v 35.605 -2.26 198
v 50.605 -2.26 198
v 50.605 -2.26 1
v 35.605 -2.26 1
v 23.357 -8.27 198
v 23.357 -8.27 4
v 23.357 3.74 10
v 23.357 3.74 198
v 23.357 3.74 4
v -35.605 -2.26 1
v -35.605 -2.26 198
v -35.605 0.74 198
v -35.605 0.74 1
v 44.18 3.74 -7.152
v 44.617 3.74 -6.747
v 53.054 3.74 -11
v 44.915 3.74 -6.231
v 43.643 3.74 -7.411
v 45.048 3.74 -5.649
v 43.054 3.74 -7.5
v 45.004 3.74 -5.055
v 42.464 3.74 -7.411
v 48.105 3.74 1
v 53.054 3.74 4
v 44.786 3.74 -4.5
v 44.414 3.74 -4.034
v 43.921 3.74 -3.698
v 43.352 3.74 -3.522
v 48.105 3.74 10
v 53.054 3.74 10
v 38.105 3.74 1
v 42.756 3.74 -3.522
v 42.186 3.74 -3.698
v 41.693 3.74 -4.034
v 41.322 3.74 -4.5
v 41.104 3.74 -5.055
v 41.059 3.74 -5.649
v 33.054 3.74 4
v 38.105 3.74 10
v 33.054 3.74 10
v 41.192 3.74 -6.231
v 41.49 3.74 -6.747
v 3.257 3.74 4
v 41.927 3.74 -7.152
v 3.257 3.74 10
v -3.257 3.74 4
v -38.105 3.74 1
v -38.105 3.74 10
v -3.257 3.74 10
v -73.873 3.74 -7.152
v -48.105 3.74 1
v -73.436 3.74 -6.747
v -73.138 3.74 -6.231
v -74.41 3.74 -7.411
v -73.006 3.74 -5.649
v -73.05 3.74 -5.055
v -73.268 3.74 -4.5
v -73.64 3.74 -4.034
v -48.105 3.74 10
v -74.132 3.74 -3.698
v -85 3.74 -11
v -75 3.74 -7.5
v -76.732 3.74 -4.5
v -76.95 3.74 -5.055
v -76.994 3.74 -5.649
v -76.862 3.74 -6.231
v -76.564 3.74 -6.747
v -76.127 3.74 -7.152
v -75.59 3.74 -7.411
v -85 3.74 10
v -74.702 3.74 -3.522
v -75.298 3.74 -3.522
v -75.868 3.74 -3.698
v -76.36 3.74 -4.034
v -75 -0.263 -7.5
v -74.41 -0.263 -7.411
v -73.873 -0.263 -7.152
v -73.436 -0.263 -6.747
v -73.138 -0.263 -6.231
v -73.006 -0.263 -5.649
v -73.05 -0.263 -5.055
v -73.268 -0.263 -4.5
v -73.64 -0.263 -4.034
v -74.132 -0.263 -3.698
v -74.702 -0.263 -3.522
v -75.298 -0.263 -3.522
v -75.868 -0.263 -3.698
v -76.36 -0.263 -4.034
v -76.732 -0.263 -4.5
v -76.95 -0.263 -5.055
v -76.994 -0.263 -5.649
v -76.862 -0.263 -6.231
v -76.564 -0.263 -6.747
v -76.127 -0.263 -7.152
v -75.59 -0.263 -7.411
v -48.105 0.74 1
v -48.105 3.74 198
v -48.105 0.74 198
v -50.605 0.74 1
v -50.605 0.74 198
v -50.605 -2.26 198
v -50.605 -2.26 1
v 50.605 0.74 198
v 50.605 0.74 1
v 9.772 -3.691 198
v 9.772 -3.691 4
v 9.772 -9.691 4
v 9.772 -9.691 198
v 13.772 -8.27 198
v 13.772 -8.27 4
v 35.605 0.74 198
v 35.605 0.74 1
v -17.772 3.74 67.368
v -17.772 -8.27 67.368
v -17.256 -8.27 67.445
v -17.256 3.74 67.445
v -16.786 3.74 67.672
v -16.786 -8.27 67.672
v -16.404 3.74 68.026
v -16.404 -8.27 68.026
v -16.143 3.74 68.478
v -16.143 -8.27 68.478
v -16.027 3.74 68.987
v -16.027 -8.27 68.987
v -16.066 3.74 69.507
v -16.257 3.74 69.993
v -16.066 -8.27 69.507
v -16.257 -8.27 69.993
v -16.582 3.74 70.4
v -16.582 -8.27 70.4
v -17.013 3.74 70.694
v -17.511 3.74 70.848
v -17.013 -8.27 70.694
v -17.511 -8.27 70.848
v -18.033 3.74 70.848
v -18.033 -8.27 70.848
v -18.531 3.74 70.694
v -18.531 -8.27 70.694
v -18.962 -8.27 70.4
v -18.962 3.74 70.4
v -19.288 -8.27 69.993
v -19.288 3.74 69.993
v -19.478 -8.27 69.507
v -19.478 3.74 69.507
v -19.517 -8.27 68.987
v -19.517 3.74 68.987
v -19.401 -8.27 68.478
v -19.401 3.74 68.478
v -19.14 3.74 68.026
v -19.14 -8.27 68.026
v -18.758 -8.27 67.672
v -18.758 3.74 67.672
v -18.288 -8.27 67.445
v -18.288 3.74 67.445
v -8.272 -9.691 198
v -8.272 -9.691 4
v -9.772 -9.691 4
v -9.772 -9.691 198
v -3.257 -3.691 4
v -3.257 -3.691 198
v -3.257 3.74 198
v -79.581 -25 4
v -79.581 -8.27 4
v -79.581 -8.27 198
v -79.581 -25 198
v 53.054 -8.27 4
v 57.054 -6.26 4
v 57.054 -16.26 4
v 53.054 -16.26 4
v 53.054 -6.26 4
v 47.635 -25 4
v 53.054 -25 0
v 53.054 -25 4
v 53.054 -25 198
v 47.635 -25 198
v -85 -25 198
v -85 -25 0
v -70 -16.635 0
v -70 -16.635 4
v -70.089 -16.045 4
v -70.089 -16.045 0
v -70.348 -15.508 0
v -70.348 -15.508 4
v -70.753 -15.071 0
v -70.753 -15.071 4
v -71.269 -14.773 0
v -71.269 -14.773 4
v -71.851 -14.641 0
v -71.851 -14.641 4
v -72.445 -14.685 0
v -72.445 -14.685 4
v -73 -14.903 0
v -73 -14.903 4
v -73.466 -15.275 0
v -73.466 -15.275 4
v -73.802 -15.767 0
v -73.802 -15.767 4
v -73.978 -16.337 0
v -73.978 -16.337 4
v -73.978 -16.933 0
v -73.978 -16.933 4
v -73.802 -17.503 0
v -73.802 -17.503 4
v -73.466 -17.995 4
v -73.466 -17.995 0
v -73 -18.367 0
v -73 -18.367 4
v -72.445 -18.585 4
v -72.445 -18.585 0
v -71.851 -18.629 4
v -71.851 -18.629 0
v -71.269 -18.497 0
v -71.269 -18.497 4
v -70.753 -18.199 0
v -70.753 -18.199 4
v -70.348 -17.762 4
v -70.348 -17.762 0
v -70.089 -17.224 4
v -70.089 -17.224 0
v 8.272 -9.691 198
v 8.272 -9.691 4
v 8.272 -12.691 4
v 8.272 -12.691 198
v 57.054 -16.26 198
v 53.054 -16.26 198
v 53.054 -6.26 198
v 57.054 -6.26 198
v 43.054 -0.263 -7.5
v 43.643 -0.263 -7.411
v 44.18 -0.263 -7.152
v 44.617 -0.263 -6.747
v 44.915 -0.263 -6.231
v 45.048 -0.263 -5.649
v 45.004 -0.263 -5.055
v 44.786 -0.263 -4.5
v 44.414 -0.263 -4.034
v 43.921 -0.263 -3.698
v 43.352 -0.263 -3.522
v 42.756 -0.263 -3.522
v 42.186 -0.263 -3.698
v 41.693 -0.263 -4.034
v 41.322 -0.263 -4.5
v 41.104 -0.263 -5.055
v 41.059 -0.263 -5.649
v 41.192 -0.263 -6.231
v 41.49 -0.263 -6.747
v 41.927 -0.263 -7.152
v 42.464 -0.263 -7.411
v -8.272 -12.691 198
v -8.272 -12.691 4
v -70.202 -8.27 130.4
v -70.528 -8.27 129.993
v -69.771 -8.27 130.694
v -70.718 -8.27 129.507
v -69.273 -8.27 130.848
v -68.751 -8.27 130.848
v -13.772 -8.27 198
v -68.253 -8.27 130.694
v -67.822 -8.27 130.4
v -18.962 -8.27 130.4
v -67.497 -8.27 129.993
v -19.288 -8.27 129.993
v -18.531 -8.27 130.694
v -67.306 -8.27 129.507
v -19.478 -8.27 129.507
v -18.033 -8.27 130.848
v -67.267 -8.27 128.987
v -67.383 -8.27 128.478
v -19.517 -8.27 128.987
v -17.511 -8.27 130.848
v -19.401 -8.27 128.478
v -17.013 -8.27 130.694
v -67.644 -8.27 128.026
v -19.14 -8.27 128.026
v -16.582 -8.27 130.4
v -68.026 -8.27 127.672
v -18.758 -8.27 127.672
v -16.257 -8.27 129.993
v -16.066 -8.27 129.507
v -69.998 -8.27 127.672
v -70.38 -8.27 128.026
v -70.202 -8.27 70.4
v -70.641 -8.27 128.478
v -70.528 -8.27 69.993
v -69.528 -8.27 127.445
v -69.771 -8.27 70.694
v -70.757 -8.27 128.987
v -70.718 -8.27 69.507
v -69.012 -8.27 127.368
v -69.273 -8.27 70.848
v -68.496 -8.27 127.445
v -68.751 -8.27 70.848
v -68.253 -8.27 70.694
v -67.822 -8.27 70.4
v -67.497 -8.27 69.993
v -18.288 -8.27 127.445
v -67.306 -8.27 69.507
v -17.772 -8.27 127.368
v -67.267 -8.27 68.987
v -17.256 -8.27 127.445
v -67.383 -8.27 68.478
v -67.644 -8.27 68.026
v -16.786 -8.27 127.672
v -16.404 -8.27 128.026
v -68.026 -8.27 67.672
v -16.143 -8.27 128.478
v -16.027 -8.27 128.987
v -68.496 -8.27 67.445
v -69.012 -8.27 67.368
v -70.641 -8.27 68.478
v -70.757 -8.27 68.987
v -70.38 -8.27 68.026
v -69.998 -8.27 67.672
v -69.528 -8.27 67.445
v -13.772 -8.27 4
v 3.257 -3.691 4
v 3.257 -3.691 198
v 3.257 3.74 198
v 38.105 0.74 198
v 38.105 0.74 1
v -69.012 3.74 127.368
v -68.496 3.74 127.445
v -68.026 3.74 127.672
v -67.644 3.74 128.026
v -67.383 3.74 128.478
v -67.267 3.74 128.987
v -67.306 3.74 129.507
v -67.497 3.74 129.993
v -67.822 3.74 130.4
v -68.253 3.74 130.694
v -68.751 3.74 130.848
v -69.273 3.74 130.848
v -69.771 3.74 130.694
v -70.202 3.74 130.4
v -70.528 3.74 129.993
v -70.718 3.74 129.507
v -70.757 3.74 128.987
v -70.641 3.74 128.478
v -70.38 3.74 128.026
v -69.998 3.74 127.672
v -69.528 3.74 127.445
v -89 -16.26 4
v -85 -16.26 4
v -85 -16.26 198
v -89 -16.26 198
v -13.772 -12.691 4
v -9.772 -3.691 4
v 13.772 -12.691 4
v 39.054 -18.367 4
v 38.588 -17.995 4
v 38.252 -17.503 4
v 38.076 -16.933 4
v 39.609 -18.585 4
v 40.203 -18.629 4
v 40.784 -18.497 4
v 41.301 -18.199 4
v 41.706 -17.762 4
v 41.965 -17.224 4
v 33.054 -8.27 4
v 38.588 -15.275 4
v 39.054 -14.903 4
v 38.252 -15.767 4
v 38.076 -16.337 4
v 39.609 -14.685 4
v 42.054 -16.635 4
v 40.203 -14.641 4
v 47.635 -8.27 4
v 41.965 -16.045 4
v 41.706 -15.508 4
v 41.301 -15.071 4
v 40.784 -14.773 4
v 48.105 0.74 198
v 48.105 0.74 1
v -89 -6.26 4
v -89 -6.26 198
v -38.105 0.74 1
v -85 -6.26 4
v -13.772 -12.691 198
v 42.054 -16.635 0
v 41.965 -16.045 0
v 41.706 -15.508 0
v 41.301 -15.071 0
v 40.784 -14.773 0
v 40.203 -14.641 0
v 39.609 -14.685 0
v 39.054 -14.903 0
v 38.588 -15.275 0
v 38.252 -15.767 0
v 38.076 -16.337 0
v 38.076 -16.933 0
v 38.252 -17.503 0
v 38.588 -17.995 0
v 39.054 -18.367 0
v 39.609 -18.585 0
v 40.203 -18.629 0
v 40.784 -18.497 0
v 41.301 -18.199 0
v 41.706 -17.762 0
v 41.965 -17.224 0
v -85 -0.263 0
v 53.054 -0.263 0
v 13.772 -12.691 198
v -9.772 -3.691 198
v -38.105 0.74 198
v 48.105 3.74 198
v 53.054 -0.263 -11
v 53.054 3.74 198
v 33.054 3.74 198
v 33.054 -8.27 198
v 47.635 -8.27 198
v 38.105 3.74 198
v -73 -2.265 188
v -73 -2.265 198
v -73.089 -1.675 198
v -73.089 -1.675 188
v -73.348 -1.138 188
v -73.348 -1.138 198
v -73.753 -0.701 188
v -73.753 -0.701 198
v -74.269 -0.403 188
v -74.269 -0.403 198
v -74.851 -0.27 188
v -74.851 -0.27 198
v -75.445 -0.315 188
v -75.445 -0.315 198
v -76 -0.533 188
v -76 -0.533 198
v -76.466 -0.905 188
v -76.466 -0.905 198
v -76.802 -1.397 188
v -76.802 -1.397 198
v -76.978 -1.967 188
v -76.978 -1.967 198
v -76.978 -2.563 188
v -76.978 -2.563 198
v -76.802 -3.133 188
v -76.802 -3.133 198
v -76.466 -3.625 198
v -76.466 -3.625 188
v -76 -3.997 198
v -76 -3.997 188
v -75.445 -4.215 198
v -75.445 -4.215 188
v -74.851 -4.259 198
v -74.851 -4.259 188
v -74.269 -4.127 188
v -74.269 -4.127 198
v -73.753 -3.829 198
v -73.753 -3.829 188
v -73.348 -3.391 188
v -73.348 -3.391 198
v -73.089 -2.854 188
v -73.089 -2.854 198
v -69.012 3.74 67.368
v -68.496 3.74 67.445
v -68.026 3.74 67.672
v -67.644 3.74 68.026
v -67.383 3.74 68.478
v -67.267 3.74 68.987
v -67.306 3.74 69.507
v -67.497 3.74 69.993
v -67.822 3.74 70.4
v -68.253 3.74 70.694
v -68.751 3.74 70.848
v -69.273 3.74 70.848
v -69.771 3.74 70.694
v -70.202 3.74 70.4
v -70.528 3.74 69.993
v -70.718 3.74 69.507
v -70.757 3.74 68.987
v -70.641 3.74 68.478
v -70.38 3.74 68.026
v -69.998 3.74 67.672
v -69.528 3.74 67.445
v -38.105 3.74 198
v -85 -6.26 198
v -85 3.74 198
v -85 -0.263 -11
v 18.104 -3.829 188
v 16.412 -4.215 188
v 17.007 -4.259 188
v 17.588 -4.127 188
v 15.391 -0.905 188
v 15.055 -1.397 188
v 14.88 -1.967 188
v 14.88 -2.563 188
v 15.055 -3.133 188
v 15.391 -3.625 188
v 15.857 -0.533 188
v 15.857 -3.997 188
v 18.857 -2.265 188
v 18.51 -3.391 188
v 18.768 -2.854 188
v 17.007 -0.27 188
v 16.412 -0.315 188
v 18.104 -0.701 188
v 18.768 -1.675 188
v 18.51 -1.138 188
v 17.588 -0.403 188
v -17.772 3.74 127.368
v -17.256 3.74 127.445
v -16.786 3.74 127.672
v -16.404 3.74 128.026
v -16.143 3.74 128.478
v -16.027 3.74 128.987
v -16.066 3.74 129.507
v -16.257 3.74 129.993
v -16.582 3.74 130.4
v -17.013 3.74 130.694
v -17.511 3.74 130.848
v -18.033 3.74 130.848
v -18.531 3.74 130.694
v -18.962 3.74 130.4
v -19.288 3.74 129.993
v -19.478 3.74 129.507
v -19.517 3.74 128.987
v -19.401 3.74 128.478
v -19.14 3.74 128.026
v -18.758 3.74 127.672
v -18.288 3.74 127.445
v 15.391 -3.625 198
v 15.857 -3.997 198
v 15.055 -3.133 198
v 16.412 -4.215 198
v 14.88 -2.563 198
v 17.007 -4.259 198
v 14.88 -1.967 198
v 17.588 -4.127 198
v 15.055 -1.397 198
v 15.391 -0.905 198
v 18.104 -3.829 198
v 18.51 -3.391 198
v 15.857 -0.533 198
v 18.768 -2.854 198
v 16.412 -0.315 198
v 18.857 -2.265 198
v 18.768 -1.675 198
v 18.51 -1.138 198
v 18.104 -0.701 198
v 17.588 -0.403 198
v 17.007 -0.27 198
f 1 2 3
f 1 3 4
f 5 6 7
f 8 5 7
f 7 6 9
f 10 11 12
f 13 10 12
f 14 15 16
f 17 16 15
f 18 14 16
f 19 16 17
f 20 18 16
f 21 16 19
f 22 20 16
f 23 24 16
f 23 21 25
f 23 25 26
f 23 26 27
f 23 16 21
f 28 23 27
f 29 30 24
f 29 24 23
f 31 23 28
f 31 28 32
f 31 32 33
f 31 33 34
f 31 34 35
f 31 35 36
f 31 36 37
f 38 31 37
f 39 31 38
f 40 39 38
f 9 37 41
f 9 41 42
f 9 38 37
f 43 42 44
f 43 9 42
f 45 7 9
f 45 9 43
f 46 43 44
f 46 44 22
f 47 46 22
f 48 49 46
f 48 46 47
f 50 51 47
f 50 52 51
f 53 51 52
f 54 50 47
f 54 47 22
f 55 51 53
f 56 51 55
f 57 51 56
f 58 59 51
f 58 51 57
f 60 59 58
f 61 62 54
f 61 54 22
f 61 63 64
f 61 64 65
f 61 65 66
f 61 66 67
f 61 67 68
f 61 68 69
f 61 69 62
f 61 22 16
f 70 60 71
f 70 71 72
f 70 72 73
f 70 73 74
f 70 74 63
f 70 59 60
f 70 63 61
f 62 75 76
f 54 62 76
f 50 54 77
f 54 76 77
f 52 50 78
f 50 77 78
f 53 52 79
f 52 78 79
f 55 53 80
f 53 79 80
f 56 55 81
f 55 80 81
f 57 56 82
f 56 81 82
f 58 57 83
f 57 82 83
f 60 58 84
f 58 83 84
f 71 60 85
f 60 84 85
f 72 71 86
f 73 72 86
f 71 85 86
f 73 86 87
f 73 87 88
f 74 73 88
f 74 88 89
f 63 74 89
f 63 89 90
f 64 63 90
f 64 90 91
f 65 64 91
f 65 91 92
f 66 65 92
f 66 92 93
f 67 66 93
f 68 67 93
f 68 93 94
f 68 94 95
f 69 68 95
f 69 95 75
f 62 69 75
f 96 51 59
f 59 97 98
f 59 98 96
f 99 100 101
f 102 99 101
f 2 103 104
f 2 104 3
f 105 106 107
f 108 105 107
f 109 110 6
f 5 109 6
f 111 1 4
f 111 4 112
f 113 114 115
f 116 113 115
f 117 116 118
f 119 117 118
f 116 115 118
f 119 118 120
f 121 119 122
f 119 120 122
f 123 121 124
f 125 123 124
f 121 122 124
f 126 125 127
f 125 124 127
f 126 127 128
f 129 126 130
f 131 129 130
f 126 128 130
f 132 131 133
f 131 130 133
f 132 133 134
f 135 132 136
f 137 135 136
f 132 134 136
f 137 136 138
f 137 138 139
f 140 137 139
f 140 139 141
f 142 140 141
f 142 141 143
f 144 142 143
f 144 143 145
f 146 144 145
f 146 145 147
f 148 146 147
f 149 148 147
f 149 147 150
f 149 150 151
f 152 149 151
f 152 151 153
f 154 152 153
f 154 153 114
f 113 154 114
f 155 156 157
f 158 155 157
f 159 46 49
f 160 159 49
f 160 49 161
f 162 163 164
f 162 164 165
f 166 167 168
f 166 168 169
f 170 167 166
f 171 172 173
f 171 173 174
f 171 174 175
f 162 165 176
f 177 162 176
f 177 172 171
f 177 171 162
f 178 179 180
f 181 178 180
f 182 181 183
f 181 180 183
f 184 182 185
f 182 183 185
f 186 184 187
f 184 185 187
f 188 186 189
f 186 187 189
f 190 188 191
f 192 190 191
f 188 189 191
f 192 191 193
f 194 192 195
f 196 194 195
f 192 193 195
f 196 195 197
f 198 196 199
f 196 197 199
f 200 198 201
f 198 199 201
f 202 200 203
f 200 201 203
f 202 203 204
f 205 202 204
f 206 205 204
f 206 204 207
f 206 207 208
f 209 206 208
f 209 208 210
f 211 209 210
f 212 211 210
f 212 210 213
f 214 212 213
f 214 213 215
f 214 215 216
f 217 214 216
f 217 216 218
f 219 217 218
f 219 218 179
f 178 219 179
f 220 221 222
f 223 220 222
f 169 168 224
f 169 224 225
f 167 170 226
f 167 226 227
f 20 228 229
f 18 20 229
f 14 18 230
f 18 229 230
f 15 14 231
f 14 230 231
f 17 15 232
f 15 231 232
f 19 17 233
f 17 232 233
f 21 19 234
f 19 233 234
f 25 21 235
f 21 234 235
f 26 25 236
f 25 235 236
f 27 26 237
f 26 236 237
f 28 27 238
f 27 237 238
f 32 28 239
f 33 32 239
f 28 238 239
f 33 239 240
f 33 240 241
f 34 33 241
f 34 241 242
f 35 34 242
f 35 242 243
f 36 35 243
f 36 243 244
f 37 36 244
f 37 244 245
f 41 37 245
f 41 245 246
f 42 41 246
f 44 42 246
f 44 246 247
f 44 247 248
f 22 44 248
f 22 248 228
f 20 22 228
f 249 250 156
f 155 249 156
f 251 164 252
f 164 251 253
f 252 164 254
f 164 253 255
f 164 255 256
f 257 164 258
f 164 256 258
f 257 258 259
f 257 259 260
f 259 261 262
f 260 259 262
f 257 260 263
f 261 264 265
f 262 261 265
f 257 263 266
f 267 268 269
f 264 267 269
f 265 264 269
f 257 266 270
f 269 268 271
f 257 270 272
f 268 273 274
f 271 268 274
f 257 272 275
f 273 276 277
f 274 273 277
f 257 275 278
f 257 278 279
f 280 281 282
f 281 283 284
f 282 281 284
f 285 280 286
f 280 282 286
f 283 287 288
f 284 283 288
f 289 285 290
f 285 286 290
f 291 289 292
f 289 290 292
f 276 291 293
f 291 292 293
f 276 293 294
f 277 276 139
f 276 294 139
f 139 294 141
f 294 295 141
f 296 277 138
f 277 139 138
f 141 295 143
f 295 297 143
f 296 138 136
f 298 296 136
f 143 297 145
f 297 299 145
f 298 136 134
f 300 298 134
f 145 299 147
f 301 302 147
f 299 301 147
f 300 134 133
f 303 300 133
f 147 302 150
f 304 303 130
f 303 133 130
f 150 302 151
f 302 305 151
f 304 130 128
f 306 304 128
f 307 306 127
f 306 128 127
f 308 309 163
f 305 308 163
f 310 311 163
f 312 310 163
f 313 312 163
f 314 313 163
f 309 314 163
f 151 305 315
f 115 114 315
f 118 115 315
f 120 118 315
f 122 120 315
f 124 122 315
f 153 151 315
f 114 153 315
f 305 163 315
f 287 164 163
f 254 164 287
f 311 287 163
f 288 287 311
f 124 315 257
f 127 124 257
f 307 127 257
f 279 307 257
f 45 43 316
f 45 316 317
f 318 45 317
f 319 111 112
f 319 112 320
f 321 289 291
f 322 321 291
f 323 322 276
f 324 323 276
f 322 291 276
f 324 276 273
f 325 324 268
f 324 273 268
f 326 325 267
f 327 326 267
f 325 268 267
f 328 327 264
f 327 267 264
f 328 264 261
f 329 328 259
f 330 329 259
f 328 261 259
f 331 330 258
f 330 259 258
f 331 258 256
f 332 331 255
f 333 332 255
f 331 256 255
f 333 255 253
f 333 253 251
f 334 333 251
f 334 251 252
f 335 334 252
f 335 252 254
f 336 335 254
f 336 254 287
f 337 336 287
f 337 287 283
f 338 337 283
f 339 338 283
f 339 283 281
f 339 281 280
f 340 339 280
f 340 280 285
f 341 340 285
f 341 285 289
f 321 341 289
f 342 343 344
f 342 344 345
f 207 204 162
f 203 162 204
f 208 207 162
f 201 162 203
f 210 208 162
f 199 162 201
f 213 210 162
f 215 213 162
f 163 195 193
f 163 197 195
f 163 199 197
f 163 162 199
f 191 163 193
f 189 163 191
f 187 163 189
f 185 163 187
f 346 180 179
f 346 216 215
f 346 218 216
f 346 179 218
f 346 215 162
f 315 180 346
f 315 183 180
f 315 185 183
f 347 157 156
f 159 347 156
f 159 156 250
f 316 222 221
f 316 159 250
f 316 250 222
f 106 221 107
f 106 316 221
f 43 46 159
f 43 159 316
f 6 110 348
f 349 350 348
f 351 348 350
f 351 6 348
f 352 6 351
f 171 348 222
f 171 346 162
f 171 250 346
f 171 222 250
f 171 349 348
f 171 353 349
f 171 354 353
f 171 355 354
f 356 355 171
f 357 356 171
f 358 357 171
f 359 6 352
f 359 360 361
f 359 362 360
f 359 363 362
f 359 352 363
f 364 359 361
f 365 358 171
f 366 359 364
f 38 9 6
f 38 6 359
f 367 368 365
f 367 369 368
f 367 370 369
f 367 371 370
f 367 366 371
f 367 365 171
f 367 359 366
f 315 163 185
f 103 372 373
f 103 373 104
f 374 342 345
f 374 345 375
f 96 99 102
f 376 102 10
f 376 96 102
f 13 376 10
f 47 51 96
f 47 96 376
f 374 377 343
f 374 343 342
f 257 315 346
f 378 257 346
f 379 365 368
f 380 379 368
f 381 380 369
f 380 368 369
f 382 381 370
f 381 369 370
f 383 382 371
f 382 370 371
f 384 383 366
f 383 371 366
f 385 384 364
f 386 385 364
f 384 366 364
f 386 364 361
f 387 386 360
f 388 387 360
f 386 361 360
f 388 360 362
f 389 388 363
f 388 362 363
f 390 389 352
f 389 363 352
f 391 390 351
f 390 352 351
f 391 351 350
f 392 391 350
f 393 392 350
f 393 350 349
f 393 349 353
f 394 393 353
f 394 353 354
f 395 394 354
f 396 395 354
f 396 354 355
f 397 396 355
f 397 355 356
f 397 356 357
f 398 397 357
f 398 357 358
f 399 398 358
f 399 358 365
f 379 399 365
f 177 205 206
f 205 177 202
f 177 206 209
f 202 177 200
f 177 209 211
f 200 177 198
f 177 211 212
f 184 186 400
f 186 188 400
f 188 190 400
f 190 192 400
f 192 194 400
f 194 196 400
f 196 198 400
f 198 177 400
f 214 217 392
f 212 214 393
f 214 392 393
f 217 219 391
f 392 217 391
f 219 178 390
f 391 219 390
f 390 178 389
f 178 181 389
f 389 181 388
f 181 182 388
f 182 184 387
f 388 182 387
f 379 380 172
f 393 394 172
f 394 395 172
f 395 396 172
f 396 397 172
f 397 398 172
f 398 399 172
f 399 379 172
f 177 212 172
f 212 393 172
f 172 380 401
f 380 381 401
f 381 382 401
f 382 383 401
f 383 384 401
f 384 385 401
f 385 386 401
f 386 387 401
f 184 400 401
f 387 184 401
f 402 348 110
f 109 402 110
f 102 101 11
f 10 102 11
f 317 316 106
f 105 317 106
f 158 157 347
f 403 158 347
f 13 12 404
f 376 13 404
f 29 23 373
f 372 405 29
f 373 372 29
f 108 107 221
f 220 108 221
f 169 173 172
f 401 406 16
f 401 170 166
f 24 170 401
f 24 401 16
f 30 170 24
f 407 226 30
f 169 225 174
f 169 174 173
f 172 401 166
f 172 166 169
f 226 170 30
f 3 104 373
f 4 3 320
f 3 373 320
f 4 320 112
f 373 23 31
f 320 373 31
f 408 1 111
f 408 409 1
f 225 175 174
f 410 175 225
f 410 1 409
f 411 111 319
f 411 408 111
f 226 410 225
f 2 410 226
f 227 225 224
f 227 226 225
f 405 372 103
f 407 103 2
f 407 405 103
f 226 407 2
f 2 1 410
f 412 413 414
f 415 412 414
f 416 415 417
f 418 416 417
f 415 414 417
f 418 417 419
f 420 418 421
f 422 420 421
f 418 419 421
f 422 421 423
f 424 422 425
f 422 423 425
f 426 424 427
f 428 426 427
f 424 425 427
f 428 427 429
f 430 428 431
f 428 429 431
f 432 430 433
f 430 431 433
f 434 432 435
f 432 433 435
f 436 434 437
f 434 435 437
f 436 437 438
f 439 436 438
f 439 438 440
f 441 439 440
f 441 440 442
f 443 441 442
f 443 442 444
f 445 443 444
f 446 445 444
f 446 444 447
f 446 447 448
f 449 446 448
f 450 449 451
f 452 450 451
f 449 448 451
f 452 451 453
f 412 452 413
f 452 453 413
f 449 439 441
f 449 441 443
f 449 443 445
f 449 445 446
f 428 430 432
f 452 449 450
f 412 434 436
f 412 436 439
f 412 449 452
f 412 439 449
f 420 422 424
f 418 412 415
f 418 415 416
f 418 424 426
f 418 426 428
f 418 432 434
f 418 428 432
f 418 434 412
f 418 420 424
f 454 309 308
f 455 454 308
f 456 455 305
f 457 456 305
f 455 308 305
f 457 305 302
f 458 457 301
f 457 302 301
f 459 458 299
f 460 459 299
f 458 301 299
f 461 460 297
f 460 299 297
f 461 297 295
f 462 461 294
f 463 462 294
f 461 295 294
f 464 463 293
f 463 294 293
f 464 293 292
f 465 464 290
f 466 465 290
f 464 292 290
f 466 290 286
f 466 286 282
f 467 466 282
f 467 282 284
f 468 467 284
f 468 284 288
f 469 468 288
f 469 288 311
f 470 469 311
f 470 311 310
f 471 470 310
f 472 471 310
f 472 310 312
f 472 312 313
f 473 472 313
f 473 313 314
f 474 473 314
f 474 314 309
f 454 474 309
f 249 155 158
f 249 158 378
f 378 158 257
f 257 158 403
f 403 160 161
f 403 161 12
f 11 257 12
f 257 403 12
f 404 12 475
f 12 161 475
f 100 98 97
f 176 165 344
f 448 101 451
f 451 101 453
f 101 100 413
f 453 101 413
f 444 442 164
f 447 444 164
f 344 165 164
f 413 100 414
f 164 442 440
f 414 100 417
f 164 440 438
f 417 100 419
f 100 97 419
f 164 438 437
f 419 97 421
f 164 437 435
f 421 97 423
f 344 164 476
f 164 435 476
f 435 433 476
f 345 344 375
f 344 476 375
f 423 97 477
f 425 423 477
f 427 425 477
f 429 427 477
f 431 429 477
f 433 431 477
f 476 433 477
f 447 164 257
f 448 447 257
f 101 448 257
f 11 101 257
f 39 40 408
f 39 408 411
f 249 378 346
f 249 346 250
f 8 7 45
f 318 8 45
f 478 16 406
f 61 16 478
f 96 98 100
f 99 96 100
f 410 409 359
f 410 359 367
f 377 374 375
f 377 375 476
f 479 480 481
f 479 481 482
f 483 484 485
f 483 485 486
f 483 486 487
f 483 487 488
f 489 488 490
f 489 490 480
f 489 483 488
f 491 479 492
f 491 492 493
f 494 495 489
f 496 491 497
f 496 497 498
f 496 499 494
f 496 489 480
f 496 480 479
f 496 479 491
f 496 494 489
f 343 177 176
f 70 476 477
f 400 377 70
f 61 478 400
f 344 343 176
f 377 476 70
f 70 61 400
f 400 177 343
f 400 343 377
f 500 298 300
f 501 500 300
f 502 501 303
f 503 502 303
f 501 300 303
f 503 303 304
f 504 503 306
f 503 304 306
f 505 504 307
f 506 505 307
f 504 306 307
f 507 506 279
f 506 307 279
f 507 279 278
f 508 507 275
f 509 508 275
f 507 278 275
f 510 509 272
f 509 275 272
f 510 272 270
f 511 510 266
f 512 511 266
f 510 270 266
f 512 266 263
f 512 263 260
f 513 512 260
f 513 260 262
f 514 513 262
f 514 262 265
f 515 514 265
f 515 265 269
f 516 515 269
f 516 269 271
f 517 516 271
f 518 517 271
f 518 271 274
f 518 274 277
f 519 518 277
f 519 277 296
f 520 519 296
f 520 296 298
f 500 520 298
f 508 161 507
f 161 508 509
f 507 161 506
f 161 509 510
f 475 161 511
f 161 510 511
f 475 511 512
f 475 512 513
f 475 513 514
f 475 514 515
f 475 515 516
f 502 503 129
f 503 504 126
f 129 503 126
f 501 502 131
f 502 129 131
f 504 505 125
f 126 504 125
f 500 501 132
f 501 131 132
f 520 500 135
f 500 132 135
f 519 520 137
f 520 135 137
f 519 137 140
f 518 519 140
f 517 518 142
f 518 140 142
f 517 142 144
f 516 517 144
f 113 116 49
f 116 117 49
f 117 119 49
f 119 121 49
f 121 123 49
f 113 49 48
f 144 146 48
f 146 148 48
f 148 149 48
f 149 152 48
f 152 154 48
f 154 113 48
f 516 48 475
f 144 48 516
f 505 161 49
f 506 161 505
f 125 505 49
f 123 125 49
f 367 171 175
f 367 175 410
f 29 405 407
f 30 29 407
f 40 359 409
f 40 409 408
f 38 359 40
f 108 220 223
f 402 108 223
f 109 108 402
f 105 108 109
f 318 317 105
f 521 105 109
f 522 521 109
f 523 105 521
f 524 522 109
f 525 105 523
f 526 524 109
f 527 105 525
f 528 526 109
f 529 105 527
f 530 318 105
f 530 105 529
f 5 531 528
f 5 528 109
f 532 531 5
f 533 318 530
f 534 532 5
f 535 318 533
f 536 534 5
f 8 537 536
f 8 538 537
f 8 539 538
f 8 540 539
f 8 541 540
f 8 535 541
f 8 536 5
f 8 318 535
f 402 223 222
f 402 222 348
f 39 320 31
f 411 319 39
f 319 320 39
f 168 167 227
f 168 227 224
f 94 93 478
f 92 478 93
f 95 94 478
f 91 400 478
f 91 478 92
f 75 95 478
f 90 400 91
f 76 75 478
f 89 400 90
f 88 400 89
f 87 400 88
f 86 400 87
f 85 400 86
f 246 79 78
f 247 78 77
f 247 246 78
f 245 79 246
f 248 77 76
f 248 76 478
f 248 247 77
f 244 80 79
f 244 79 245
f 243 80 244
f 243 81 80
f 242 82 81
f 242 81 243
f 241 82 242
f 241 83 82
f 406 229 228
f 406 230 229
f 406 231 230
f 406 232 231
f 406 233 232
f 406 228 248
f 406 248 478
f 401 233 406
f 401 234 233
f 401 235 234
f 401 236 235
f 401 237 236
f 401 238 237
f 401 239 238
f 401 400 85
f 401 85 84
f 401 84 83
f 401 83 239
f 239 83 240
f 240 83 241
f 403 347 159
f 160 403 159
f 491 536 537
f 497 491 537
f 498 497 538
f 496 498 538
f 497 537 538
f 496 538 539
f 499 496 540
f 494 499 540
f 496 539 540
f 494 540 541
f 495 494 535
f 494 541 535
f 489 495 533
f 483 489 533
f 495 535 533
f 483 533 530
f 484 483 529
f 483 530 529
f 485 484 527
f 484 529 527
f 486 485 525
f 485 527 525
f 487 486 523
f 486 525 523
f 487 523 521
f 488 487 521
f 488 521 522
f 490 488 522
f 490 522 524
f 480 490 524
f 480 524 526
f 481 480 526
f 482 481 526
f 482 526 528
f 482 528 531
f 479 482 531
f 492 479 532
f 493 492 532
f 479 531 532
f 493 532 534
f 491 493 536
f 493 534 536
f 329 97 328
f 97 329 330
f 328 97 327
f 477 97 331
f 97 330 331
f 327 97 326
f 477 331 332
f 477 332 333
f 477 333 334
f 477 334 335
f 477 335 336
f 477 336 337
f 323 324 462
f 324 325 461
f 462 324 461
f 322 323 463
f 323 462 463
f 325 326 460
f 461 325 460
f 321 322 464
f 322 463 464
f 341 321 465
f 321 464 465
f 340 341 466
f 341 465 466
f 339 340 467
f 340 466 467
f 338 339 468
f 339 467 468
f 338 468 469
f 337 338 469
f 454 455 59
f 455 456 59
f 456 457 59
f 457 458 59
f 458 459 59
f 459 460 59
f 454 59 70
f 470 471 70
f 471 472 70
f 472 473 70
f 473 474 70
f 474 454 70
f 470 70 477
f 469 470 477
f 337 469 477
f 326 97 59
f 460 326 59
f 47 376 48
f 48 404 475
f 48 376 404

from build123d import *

# Parameters (mm, degrees)
CROQUIS1_W              = 170
CROQUIS1_H              = 50
SALIENTE_EXTRUIR1_DEPTH = 4
CROQUIS3_W              = 20
CROQUIS3_H              = 12.01
SALIENTE_EXTRUIR2_DEPTH = 194
CROQUIS22_W             = 170
CROQUIS22_H             = 21.26
CORTAR_EXTRUIR12_DEPTH  = 10
CROQUIS23_W             = 170
CROQUIS23_H             = 8.12284292
SALIENTE_EXTRUIR6_DEPTH = 11
CROQUIS25_W             = 6.514763964
CROQUIS25_H             = 194
CORTAR_EXTRUIR16_DEPTH  = 10
CROQUIS27_R             = 1.75
CORTAR_EXTRUIR17_DEPTH  = 30.74
CORTAR_EXTRUIR18_DEPTH  = 197
CROQUIS29_W             = 31.946298055
CROQUIS29_H             = 28.740140904
CORTAR_EXTRUIR19_DEPTH  = 197
CROQUIS30_R             = 2
CORTAR_EXTRUIR20_DEPTH  = 197
CROQUIS31_R             = 2
UNI_N_TECHO_DEPTH       = 10
CROQUIS33_R             = 2
CORTAR_EXTRUIR22_DEPTH  = 10
CROQUIS35_W             = 138.053701945
CROQUIS35_H             = 11
CORTAR_EXTRUIR24_DEPTH  = 4.12
SALIENTE_EXTRUIR7_DEPTH = 194


with BuildPart() as part:
    # Croquis1 → Saliente-Extruir1 (new body)
    with BuildSketch(Plane.XY):
        Rectangle(CROQUIS1_W, CROQUIS1_H)
    extrude(amount=SALIENTE_EXTRUIR1_DEPTH)

    # Croquis3 → Saliente-Extruir2 (add)
    with BuildSketch(Plane.XY.offset(4)):
        Polygon((-13.772145946, -12.69105844), (-9.772145946, -12.69105844), (-8.272145946, -12.69105844), (-8.272145946, -9.69105844), (-9.772145946, -9.69105844), (-9.772145946, -3.69105844), (9.772145946, -3.69105844), (9.772145946, -9.69105844), (8.272145946, -9.69105844), (8.272145946, -12.69105844), (9.772145946, -12.69105844), (13.772145946, -12.69105844), (13.772145946, -8.269859096), (23.357191672, -8.269859096), (23.357191672, 3.740140904), (-85, 3.740140904), (-85, -8.269859096), (-13.772145946, -8.269859096), align=None)
        with Locations((43.053701945, -2.264859096)):
            Rectangle(CROQUIS3_W, CROQUIS3_H)
    extrude(amount=SALIENTE_EXTRUIR2_DEPTH)

    # Croquis22 → Cortar-Extruir12 (cut)
    with BuildSketch(Plane(origin=(0, 0, 0), x_dir=(-1, 0, 0), z_dir=(0, 0, -1))):
        with Locations((0, 14.37)):
            Rectangle(CROQUIS22_W, CROQUIS22_H)
    extrude(amount=-CORTAR_EXTRUIR12_DEPTH, mode=Mode.SUBTRACT)

    # Croquis23 → Saliente-Extruir6 (add)
    with BuildSketch(Plane(origin=(0, 0, 0), x_dir=(-1, 0, 0), z_dir=(0, 0, -1))):
        with Locations((0, -0.32142146)):
            Rectangle(CROQUIS23_W, CROQUIS23_H)
    extrude(amount=SALIENTE_EXTRUIR6_DEPTH)

    # Croquis25 → Cortar-Extruir16 (cut)
    with BuildSketch(Plane.XZ.offset(3.69105844)):
        with Locations((0, 101)):
            Rectangle(CROQUIS25_W, CROQUIS25_H)
    extrude(amount=-CORTAR_EXTRUIR16_DEPTH, mode=Mode.SUBTRACT)

    # Croquis27 → Cortar-Extruir17 (cut)
    with BuildSketch(Plane.XZ.offset(8.269859096)):
        with Locations(Location((-69.012145946, 129.117553519, 0), (0, 0, 270))):
            Circle(CROQUIS27_R)
        with Locations(Location((-17.772145946, 129.117553519, 0), (0, 0, 270))):
            Circle(CROQUIS27_R)
        with Locations(Location((-69.012145946, 69.117553519, 0), (0, 0, 270))):
            Circle(CROQUIS27_R)
        with Locations(Location((-17.772145946, 69.117553519, 0), (0, 0, 270))):
            Circle(CROQUIS27_R)
    extrude(amount=-CORTAR_EXTRUIR17_DEPTH, mode=Mode.SUBTRACT)

    # Croquis28 → Cortar-Extruir18 (cut)
    with BuildSketch(Plane.XY.offset(198)):
        Polygon((50.605, 0.740140904), (50.605, -2.259859096), (35.605, -2.259859096), (35.605, 0.740140904), (38.105, 0.740140904), (38.105, 3.740140904), (48.105, 3.740140904), (48.105, 0.740140904), align=None)
        Polygon((-38.105, 3.740140904), (-48.105, 3.740140904), (-48.105, 0.740140904), (-50.605, 0.740140904), (-50.605, -2.259859096), (-35.605, -2.259859096), (-35.605, 0.740140904), (-38.105, 0.740140904), align=None)
    extrude(amount=-CORTAR_EXTRUIR18_DEPTH, mode=Mode.SUBTRACT)

    # Croquis29 → Cortar-Extruir19 (cut)
    with BuildSketch(Plane.XY.offset(4)):
        with Locations((69.026850973, -10.629929548)):
            Rectangle(CROQUIS29_W, CROQUIS29_H)
    extrude(amount=-CORTAR_EXTRUIR19_DEPTH, mode=Mode.SUBTRACT)

    # Croquis30 → Cortar-Extruir20 (cut)
    with BuildSketch(Plane.XY.offset(4)):
        with Locations((-72, -16.634929548)):
            Circle(CROQUIS30_R)
        with Locations((40.053701945, -16.634929548)):
            Circle(CROQUIS30_R)
    extrude(amount=-CORTAR_EXTRUIR20_DEPTH, mode=Mode.SUBTRACT)

    # Croquis31 → Unión techo (cut)
    with BuildSketch(Plane.XY.offset(198)):
        with Locations((-75, -2.264859096)):
            Circle(CROQUIS31_R)
        with Locations((16.857191672, -2.264859096)):
            Circle(CROQUIS31_R)
    extrude(amount=-UNI_N_TECHO_DEPTH, mode=Mode.SUBTRACT)

    # Croquis33 → Cortar-Extruir22 (cut)
    with BuildSketch(Plane.XZ.offset(4.38284292)):
        with Locations(Location((-75, -5.5, 0), (0, 0, 270))):
            Circle(CROQUIS33_R)
        with Locations(Location((43.053701945, -5.5, 0), (0, 0, 270))):
            Circle(CROQUIS33_R)
    extrude(amount=-CORTAR_EXTRUIR22_DEPTH, mode=Mode.SUBTRACT)

    # Croquis35 → Cortar-Extruir24 (cut)
    with BuildSketch(Plane.XZ.offset(4.38284292)):
        with Locations((-15.973149027, -5.5)):
            Rectangle(CROQUIS35_W, CROQUIS35_H)
    extrude(amount=-CORTAR_EXTRUIR24_DEPTH, mode=Mode.SUBTRACT)

    # Croquis36 → Saliente-Extruir7 (add)
    with BuildSketch(Plane.XY.offset(4)):
        Polygon((-85, -8.269859096), (-79.581388396, -8.269859096), (-79.581388396, -25), (-85, -25), (-85, -16.259859096), (-89, -16.259859096), (-89, -6.259859096), (-85, -6.259859096), align=None)
        Polygon((53.053701945, -8.269859096), (53.053701945, -6.259859096), (57.053701945, -6.259859096), (57.053701945, -16.259859096), (53.053701945, -16.259859096), (53.053701945, -25), (47.63509034, -25), (47.63509034, -8.269859096), align=None)
    extrude(amount=SALIENTE_EXTRUIR7_DEPTH)


solid = part.part
